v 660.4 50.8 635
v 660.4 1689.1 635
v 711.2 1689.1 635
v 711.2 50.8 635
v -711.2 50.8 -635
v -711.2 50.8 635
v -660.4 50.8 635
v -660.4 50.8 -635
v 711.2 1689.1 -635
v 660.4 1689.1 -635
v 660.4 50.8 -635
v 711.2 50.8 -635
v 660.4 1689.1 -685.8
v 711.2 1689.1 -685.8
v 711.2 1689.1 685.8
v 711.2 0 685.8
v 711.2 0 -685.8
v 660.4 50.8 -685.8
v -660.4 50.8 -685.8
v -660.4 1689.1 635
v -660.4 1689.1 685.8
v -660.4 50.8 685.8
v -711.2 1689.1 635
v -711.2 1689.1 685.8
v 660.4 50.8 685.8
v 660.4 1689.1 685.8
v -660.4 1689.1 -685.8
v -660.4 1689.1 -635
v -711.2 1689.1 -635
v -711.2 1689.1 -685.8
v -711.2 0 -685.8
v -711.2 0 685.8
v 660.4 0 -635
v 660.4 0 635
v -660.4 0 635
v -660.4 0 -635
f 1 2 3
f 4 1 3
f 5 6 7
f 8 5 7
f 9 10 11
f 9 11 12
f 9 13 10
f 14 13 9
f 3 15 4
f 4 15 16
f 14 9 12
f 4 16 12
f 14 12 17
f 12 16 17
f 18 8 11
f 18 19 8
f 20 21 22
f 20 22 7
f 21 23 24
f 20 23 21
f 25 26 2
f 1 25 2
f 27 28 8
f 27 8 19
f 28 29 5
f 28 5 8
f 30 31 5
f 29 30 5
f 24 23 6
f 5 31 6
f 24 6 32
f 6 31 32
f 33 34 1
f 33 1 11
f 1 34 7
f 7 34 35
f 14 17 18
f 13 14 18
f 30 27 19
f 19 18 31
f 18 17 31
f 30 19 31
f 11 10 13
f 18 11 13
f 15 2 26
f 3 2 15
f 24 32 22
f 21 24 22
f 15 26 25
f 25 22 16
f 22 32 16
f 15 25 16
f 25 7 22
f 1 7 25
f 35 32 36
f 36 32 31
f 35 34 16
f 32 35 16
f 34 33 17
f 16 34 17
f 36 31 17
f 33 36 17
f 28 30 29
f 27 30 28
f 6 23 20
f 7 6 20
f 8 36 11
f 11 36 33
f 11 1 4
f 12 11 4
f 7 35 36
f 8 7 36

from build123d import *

# Parameters (mm, degrees)
SKETCH1_W           = 1320.8
SKETCH1_H           = 50.8
SKETCH1_W_2         = 50.8
SKETCH1_H_2         = 1270
BOSS_EXTRUDE1_DEPTH = 50.8
SKETCH1_3_W         = 50.8
SKETCH1_3_H         = 50.8
BOSS_EXTRUDE2_DEPTH = 1689.1


with BuildPart() as part:
    # Sketch1 → Boss-Extrude1 (new body)
    with BuildSketch(Plane(origin=(0, 0, 0), x_dir=(1, 0, 0), z_dir=(0, 1, 0))):
        with Locations((0, 660.4)):
            Rectangle(SKETCH1_W, SKETCH1_H)
        with Locations((-685.8, 0)):
            Rectangle(SKETCH1_W_2, SKETCH1_H_2)
        with Locations((-685.8, 660.4)):
            Rectangle(SKETCH1_W_2, SKETCH1_H)
        with Locations((-685.8, -660.4)):
            Rectangle(SKETCH1_W_2, SKETCH1_H)
        with Locations((0, -660.4)):
            Rectangle(SKETCH1_W, SKETCH1_H)
        with Locations((685.8, -660.4)):
            Rectangle(SKETCH1_W_2, SKETCH1_H)
        with Locations((685.8, 0)):
            Rectangle(SKETCH1_W_2, SKETCH1_H_2)
        with Locations((685.8, 660.4)):
            Rectangle(SKETCH1_W_2, SKETCH1_H)
    extrude(amount=BOSS_EXTRUDE1_DEPTH)

    # Sketch1<3> → Boss-Extrude2 (add)
    with BuildSketch(Plane(origin=(0, 0, 0), x_dir=(1, 0, 0), z_dir=(0, 1, 0))):
        with Locations((-685.8, -660.4)):
            Rectangle(SKETCH1_3_W, SKETCH1_3_H)
        with Locations((-685.8, 660.4)):
            Rectangle(SKETCH1_3_W, SKETCH1_3_H)
        with Locations((685.8, 660.4)):
            Rectangle(SKETCH1_3_W, SKETCH1_3_H)
        with Locations((685.8, -660.4)):
            Rectangle(SKETCH1_3_W, SKETCH1_3_H)
    extrude(amount=BOSS_EXTRUDE2_DEPTH)


solid = part.part
